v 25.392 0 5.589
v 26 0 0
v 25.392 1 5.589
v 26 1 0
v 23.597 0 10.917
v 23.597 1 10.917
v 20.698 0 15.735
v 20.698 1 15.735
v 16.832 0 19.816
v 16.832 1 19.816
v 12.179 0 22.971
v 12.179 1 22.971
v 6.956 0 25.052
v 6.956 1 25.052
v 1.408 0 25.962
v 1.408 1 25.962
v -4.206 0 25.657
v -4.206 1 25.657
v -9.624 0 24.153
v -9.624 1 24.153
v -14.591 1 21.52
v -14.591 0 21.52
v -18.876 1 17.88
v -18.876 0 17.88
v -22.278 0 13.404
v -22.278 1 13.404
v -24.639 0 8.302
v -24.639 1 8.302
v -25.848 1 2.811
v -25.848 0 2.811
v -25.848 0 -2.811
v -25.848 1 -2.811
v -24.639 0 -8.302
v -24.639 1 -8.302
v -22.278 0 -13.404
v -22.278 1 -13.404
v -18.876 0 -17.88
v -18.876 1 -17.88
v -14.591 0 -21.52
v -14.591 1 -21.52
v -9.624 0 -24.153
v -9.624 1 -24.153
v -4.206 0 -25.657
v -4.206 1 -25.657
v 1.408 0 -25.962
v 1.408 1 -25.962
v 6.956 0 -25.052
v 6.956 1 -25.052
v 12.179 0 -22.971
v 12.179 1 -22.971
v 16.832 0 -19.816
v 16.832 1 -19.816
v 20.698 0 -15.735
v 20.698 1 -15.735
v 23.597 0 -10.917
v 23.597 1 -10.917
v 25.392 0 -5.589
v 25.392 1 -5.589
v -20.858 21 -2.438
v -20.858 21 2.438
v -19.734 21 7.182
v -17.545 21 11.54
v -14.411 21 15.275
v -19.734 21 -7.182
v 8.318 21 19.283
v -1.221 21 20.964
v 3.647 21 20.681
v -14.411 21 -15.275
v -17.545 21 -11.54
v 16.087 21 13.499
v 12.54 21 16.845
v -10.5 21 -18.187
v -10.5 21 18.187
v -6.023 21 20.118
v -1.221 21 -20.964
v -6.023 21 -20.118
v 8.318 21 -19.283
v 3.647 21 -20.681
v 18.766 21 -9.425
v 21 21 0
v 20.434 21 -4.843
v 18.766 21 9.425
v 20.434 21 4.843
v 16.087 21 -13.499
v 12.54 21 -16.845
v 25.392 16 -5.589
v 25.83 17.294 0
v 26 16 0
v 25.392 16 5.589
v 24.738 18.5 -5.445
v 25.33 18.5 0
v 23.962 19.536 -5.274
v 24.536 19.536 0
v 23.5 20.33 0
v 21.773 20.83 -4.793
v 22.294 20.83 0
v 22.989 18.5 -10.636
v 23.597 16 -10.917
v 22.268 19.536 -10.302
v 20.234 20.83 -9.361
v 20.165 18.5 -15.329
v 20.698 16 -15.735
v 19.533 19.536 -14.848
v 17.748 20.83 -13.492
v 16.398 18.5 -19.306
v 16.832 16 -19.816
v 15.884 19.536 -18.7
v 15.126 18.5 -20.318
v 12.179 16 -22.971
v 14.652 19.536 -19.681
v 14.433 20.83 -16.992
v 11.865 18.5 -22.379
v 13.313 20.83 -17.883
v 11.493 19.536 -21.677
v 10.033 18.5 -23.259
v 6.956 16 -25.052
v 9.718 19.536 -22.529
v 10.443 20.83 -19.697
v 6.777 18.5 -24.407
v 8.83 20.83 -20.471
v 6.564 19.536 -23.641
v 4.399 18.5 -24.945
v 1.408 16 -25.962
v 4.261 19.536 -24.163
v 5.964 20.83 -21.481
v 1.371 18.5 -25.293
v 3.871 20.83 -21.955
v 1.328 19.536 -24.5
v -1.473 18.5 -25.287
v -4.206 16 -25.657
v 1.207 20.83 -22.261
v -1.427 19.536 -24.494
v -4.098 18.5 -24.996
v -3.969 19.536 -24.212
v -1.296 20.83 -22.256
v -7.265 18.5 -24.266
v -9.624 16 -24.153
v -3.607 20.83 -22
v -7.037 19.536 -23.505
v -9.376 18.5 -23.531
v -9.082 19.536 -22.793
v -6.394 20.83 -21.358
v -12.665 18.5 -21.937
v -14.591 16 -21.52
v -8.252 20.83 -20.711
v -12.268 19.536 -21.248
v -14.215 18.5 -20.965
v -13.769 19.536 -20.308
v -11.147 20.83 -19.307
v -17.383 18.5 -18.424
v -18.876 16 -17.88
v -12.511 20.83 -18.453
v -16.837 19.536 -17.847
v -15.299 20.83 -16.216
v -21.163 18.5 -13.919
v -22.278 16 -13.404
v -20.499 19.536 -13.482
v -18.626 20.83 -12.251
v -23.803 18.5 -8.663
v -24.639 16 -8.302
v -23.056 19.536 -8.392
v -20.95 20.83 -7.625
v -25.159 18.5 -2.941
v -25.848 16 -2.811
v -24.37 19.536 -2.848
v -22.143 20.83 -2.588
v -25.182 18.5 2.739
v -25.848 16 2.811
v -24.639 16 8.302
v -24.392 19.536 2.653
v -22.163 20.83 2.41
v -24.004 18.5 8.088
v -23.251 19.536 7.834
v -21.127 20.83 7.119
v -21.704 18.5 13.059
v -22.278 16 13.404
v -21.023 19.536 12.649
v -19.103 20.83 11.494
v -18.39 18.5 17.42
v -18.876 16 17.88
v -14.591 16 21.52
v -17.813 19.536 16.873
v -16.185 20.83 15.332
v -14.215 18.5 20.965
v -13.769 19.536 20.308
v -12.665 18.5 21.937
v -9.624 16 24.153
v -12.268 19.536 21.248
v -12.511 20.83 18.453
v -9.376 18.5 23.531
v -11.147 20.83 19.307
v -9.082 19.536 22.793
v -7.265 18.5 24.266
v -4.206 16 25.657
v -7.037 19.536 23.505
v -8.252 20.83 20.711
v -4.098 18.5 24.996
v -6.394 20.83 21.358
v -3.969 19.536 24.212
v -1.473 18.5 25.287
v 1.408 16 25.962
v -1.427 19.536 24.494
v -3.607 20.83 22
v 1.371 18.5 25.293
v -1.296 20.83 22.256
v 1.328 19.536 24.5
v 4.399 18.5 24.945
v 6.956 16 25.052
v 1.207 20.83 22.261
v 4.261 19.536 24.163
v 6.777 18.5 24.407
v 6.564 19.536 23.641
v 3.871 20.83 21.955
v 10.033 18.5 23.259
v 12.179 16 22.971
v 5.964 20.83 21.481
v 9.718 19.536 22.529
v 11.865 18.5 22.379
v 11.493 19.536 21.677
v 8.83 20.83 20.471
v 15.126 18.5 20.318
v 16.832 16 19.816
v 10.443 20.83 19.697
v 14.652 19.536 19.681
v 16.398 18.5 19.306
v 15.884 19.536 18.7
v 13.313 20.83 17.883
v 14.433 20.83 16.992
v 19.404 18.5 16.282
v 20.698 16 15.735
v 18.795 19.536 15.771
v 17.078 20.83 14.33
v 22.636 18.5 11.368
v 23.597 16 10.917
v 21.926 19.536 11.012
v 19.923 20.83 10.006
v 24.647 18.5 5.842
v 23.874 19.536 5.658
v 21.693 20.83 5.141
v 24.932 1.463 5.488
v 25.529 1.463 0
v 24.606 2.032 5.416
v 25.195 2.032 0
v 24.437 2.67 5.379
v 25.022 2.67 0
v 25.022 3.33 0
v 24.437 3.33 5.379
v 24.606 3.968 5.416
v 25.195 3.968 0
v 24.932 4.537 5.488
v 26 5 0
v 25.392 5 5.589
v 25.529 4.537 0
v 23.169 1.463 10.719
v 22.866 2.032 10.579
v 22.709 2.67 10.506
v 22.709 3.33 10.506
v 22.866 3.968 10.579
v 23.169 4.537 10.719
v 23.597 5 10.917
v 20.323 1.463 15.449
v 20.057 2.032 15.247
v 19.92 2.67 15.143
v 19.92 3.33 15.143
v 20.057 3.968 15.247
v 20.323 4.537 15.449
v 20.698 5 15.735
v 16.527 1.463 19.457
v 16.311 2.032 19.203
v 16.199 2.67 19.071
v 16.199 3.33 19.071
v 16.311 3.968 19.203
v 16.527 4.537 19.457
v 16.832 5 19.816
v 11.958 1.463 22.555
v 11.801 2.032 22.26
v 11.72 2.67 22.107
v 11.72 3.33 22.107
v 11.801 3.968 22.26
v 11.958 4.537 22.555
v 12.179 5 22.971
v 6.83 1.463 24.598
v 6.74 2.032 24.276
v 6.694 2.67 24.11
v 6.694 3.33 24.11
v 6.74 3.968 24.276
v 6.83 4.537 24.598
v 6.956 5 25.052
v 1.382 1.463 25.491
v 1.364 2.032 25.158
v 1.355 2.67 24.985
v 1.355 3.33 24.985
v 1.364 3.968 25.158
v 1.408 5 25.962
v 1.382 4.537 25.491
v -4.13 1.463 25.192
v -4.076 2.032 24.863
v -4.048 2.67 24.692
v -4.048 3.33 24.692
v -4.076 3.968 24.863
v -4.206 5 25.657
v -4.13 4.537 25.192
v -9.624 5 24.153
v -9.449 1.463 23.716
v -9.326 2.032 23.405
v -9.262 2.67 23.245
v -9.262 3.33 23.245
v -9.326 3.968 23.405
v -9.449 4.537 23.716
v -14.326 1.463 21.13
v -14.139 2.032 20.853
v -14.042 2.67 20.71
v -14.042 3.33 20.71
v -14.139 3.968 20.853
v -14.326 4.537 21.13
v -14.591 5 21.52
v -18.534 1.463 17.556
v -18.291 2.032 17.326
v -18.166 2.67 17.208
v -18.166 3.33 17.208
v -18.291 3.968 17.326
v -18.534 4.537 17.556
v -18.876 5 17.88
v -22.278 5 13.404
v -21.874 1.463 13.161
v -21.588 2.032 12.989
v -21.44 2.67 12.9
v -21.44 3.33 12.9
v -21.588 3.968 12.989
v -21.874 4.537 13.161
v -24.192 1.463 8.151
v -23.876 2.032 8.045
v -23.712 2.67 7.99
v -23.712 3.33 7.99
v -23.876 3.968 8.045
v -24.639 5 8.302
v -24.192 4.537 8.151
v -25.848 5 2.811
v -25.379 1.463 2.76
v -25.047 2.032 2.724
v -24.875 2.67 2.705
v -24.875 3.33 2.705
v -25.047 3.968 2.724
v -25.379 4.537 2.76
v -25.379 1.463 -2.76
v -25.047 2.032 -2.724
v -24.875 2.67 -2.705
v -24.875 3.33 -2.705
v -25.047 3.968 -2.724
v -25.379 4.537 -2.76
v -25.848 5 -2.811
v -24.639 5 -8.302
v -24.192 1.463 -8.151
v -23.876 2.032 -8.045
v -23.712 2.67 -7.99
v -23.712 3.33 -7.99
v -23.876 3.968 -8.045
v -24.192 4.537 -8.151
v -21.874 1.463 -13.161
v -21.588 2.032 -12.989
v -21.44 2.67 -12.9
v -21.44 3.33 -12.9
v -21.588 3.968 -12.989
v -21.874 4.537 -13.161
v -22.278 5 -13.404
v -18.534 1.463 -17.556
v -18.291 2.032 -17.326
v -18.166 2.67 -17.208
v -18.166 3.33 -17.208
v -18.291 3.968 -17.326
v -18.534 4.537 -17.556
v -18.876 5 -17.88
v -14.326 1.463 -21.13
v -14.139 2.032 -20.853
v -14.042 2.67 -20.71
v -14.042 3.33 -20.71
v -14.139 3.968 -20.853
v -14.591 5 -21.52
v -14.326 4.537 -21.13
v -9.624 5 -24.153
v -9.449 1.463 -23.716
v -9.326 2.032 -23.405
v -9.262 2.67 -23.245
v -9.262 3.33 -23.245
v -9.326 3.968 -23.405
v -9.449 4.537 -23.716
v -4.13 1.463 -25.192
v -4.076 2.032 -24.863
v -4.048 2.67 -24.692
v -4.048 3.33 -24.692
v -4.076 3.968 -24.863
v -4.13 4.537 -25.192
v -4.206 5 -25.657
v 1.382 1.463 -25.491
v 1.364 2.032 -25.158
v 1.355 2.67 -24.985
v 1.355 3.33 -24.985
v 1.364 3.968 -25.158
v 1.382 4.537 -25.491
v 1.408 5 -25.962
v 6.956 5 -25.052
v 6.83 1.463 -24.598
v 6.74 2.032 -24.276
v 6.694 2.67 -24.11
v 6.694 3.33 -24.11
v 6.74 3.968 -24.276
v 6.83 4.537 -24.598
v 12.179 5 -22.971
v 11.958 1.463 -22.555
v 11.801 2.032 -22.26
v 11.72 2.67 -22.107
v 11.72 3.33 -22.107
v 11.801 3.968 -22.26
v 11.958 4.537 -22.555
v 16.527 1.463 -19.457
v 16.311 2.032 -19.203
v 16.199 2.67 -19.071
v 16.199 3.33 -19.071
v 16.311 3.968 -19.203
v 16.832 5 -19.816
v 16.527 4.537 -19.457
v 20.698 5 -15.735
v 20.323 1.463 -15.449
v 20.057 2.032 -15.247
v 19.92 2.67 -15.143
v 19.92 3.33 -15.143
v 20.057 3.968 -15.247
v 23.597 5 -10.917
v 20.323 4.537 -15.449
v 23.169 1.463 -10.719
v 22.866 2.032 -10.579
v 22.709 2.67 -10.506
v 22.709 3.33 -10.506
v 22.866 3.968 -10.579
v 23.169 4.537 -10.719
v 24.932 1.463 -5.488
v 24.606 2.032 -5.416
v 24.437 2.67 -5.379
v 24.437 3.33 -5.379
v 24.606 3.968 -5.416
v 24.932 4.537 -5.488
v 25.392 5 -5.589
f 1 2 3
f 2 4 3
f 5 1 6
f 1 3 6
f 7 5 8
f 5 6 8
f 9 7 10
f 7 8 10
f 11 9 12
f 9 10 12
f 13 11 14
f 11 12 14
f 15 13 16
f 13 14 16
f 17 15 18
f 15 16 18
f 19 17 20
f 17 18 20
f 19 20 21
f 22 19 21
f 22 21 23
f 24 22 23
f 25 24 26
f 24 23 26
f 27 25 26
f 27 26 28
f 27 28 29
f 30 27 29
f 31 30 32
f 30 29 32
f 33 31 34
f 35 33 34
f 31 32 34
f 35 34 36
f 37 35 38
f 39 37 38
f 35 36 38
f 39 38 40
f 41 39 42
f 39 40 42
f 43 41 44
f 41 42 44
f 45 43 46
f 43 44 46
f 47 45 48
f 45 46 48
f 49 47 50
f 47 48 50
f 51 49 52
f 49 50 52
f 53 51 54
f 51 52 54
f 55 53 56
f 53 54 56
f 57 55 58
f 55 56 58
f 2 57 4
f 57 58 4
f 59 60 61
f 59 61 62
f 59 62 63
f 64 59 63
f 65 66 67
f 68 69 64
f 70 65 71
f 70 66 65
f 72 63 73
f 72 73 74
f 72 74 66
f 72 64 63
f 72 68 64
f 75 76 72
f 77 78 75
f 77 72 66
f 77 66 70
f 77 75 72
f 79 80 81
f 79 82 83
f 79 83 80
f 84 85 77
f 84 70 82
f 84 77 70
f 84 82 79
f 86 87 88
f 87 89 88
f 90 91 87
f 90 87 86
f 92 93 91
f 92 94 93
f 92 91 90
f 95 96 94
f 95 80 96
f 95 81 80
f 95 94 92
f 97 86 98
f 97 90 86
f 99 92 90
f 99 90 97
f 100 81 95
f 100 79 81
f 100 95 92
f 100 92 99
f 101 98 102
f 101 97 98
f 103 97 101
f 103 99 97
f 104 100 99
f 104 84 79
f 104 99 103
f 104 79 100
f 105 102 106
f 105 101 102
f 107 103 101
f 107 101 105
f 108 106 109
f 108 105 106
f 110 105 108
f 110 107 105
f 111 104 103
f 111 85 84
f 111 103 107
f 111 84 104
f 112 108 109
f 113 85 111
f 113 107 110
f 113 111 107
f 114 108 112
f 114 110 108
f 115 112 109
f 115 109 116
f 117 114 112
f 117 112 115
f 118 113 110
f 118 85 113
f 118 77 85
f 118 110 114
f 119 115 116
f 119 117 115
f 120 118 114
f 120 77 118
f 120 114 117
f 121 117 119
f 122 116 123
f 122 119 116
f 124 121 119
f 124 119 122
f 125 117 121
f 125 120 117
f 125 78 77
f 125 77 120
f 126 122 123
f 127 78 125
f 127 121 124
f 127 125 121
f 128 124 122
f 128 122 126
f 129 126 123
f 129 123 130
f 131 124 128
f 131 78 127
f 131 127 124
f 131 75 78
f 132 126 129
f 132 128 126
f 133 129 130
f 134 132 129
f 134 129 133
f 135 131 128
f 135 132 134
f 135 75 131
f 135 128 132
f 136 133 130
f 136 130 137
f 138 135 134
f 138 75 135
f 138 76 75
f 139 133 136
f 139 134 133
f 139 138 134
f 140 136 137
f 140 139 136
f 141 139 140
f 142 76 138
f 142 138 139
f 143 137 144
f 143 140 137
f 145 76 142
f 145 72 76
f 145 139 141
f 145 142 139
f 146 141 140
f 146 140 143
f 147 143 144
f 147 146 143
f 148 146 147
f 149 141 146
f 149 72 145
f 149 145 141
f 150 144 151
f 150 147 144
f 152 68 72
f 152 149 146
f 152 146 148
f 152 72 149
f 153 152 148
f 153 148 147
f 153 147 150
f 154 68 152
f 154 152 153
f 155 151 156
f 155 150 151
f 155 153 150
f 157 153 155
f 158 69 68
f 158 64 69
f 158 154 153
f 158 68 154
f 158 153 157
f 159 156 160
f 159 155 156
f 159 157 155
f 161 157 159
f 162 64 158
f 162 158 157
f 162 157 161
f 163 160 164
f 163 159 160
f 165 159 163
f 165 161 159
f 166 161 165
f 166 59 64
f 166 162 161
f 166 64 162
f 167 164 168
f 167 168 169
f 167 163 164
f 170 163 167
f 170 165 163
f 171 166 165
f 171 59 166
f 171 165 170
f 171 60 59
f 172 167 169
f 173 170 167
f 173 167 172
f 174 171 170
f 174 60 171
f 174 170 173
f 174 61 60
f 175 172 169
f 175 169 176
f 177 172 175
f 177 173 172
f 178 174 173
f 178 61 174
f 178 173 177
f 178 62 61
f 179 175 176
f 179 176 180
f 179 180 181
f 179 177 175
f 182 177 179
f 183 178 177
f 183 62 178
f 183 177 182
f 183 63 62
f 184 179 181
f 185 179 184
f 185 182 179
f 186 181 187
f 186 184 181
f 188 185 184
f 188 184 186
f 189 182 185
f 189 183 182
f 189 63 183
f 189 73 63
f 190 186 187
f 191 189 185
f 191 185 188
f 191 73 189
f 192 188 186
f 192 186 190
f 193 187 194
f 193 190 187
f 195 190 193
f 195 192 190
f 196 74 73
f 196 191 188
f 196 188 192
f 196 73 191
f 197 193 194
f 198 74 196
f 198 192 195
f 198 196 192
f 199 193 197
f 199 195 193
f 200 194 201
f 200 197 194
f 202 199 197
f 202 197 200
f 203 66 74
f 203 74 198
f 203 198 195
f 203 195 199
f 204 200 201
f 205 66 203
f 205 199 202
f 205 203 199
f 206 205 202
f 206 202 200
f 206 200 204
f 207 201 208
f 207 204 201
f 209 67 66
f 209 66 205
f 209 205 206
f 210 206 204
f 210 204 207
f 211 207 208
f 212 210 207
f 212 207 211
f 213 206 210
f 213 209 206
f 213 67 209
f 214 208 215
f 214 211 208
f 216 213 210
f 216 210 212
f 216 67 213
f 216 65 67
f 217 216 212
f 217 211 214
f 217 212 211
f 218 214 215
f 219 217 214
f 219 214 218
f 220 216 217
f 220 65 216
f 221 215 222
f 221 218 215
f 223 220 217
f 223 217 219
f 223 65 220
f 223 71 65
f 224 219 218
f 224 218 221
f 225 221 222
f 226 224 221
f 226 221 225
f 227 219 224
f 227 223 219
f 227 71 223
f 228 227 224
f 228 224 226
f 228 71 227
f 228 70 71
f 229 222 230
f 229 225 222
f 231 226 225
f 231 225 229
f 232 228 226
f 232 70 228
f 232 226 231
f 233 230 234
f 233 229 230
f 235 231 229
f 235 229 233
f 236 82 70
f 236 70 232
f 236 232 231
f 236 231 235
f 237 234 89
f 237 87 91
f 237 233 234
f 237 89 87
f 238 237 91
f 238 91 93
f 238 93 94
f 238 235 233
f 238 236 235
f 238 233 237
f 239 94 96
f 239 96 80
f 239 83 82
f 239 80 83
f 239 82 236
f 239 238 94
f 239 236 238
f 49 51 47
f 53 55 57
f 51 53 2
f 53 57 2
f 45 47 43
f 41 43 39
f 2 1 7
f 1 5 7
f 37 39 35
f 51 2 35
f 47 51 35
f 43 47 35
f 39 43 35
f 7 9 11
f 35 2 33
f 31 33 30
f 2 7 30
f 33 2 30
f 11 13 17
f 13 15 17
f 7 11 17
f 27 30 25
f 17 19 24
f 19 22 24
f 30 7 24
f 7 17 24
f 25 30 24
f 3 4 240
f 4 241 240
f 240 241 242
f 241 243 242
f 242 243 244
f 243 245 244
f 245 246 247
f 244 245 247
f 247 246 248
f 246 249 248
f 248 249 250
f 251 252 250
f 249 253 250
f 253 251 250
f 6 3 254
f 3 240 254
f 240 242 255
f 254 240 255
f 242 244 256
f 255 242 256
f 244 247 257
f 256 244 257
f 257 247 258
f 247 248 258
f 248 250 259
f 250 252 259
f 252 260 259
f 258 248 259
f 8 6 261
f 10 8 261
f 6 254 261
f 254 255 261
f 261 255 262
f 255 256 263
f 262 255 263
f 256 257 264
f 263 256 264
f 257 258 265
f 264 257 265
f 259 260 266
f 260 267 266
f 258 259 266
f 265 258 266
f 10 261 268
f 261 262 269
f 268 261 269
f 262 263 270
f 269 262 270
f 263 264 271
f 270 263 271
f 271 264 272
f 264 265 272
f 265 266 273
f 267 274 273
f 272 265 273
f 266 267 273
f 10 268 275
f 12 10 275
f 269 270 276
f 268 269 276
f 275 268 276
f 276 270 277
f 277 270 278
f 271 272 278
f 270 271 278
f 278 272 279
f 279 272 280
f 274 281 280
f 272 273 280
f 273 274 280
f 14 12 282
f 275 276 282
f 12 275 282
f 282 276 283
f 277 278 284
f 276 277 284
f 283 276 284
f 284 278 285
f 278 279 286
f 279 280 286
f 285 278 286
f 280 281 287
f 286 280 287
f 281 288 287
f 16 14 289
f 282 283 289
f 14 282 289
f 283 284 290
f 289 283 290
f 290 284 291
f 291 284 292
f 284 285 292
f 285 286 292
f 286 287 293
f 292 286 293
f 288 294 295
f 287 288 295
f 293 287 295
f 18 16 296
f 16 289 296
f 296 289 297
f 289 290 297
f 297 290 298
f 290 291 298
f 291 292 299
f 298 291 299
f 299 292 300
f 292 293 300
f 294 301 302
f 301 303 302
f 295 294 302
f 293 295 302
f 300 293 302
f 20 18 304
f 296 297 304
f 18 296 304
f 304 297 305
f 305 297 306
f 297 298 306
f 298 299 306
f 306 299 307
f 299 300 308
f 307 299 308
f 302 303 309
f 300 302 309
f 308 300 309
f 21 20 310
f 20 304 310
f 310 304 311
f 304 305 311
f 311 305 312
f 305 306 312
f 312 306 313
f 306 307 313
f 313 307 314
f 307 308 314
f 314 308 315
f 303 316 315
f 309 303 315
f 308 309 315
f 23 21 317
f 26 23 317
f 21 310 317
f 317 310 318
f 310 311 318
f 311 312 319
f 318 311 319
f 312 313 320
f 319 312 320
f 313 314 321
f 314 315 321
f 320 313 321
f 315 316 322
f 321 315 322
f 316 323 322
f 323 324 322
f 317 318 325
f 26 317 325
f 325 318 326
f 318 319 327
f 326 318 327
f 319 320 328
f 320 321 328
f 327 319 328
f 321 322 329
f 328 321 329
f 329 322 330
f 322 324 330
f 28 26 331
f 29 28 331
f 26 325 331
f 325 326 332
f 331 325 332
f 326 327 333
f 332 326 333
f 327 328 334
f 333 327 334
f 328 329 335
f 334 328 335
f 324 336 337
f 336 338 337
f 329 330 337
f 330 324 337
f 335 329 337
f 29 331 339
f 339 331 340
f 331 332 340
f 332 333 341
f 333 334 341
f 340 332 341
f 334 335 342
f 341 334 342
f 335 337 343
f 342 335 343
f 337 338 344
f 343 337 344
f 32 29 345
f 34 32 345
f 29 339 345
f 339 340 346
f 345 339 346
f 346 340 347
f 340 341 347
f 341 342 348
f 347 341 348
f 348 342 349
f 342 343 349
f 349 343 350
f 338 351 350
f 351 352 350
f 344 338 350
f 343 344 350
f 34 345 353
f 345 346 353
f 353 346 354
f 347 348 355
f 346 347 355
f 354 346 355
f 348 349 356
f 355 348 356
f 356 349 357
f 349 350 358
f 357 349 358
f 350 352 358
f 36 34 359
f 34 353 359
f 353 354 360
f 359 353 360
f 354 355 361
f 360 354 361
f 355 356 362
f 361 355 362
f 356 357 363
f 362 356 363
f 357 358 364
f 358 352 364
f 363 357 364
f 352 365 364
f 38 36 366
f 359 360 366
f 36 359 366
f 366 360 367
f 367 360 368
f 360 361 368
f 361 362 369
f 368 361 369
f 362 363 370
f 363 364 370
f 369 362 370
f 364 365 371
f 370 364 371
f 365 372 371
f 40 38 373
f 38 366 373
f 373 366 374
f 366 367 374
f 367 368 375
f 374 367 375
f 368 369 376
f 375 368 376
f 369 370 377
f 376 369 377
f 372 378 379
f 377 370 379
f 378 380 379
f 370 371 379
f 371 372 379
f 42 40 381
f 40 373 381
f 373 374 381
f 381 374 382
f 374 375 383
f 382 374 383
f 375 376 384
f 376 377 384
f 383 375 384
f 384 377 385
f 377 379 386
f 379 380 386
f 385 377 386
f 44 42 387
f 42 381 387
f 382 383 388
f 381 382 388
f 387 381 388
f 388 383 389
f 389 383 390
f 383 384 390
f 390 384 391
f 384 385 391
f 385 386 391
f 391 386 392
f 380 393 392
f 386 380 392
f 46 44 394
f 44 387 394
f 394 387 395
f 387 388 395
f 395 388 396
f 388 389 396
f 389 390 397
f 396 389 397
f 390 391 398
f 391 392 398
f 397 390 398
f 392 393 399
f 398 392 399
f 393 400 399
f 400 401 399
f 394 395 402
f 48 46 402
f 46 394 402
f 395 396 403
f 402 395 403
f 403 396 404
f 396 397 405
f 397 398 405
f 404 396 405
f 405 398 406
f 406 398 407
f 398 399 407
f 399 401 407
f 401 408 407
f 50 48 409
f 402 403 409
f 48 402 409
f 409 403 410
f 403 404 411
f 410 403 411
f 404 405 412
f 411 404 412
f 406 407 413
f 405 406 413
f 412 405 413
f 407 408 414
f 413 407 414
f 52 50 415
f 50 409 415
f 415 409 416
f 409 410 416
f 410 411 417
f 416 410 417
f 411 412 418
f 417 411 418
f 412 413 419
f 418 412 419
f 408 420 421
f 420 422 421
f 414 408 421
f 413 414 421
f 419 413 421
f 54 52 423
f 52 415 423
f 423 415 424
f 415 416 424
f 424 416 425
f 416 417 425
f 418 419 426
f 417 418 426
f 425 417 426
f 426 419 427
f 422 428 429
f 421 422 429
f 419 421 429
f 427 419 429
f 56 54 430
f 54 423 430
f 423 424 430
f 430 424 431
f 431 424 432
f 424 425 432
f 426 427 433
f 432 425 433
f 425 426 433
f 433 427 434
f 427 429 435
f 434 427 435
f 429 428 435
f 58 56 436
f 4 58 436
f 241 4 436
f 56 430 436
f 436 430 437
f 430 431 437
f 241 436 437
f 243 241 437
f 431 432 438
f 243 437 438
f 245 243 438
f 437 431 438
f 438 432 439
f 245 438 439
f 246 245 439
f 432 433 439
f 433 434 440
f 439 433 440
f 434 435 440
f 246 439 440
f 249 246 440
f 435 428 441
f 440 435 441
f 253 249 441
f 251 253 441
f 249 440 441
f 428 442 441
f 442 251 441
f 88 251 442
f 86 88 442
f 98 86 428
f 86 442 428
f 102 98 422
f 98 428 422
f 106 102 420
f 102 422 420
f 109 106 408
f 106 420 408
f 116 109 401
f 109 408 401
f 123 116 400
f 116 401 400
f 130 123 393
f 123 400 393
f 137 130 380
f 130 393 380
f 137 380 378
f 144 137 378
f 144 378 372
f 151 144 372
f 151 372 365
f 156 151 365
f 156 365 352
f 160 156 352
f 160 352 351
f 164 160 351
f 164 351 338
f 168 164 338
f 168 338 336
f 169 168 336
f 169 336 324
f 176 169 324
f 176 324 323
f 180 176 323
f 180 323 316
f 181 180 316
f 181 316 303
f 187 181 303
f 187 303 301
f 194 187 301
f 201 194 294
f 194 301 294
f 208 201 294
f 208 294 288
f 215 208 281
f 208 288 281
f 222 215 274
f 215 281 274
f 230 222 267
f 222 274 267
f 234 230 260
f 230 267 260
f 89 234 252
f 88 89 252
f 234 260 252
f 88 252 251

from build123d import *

# Parameters (mm, degrees)
SKETCH_2_R      = 26
EXTRUDE_1_DEPTH = 15
FILLET_1_R      = 5


with BuildPart() as part:
    # 草图1 → 旋转1 (revolve)
    with BuildSketch(Plane.XY):
        with BuildLine():
            Line((0, 0), (26, 0))
            Line((26, 0), (26, 1))
            ThreePointArc((26, 1), (25, 3), (26, 5))
            Line((26, 5), (26, 6))
            Line((26, 6), (0, 6))
            Line((0, 6), (0, 0))
        make_face()
    revolve(axis=Axis((0, 0, 0), (0, -1, 0)))

    # 草图2 → 凸台-拉伸1 (add)
    with BuildSketch(Plane(origin=(0, 6, 0), x_dir=(1, 0, 0), z_dir=(0, 1, 0))):
        Circle(SKETCH_2_R)
    extrude(amount=EXTRUDE_1_DEPTH)

    # 圆角1
    fillet_1_edges = [part.edges().sort_by_distance(p)[0] for p in [
        (-26, 21, 0),
    ]]
    fillet(fillet_1_edges, radius=FILLET_1_R)


solid = part.part
